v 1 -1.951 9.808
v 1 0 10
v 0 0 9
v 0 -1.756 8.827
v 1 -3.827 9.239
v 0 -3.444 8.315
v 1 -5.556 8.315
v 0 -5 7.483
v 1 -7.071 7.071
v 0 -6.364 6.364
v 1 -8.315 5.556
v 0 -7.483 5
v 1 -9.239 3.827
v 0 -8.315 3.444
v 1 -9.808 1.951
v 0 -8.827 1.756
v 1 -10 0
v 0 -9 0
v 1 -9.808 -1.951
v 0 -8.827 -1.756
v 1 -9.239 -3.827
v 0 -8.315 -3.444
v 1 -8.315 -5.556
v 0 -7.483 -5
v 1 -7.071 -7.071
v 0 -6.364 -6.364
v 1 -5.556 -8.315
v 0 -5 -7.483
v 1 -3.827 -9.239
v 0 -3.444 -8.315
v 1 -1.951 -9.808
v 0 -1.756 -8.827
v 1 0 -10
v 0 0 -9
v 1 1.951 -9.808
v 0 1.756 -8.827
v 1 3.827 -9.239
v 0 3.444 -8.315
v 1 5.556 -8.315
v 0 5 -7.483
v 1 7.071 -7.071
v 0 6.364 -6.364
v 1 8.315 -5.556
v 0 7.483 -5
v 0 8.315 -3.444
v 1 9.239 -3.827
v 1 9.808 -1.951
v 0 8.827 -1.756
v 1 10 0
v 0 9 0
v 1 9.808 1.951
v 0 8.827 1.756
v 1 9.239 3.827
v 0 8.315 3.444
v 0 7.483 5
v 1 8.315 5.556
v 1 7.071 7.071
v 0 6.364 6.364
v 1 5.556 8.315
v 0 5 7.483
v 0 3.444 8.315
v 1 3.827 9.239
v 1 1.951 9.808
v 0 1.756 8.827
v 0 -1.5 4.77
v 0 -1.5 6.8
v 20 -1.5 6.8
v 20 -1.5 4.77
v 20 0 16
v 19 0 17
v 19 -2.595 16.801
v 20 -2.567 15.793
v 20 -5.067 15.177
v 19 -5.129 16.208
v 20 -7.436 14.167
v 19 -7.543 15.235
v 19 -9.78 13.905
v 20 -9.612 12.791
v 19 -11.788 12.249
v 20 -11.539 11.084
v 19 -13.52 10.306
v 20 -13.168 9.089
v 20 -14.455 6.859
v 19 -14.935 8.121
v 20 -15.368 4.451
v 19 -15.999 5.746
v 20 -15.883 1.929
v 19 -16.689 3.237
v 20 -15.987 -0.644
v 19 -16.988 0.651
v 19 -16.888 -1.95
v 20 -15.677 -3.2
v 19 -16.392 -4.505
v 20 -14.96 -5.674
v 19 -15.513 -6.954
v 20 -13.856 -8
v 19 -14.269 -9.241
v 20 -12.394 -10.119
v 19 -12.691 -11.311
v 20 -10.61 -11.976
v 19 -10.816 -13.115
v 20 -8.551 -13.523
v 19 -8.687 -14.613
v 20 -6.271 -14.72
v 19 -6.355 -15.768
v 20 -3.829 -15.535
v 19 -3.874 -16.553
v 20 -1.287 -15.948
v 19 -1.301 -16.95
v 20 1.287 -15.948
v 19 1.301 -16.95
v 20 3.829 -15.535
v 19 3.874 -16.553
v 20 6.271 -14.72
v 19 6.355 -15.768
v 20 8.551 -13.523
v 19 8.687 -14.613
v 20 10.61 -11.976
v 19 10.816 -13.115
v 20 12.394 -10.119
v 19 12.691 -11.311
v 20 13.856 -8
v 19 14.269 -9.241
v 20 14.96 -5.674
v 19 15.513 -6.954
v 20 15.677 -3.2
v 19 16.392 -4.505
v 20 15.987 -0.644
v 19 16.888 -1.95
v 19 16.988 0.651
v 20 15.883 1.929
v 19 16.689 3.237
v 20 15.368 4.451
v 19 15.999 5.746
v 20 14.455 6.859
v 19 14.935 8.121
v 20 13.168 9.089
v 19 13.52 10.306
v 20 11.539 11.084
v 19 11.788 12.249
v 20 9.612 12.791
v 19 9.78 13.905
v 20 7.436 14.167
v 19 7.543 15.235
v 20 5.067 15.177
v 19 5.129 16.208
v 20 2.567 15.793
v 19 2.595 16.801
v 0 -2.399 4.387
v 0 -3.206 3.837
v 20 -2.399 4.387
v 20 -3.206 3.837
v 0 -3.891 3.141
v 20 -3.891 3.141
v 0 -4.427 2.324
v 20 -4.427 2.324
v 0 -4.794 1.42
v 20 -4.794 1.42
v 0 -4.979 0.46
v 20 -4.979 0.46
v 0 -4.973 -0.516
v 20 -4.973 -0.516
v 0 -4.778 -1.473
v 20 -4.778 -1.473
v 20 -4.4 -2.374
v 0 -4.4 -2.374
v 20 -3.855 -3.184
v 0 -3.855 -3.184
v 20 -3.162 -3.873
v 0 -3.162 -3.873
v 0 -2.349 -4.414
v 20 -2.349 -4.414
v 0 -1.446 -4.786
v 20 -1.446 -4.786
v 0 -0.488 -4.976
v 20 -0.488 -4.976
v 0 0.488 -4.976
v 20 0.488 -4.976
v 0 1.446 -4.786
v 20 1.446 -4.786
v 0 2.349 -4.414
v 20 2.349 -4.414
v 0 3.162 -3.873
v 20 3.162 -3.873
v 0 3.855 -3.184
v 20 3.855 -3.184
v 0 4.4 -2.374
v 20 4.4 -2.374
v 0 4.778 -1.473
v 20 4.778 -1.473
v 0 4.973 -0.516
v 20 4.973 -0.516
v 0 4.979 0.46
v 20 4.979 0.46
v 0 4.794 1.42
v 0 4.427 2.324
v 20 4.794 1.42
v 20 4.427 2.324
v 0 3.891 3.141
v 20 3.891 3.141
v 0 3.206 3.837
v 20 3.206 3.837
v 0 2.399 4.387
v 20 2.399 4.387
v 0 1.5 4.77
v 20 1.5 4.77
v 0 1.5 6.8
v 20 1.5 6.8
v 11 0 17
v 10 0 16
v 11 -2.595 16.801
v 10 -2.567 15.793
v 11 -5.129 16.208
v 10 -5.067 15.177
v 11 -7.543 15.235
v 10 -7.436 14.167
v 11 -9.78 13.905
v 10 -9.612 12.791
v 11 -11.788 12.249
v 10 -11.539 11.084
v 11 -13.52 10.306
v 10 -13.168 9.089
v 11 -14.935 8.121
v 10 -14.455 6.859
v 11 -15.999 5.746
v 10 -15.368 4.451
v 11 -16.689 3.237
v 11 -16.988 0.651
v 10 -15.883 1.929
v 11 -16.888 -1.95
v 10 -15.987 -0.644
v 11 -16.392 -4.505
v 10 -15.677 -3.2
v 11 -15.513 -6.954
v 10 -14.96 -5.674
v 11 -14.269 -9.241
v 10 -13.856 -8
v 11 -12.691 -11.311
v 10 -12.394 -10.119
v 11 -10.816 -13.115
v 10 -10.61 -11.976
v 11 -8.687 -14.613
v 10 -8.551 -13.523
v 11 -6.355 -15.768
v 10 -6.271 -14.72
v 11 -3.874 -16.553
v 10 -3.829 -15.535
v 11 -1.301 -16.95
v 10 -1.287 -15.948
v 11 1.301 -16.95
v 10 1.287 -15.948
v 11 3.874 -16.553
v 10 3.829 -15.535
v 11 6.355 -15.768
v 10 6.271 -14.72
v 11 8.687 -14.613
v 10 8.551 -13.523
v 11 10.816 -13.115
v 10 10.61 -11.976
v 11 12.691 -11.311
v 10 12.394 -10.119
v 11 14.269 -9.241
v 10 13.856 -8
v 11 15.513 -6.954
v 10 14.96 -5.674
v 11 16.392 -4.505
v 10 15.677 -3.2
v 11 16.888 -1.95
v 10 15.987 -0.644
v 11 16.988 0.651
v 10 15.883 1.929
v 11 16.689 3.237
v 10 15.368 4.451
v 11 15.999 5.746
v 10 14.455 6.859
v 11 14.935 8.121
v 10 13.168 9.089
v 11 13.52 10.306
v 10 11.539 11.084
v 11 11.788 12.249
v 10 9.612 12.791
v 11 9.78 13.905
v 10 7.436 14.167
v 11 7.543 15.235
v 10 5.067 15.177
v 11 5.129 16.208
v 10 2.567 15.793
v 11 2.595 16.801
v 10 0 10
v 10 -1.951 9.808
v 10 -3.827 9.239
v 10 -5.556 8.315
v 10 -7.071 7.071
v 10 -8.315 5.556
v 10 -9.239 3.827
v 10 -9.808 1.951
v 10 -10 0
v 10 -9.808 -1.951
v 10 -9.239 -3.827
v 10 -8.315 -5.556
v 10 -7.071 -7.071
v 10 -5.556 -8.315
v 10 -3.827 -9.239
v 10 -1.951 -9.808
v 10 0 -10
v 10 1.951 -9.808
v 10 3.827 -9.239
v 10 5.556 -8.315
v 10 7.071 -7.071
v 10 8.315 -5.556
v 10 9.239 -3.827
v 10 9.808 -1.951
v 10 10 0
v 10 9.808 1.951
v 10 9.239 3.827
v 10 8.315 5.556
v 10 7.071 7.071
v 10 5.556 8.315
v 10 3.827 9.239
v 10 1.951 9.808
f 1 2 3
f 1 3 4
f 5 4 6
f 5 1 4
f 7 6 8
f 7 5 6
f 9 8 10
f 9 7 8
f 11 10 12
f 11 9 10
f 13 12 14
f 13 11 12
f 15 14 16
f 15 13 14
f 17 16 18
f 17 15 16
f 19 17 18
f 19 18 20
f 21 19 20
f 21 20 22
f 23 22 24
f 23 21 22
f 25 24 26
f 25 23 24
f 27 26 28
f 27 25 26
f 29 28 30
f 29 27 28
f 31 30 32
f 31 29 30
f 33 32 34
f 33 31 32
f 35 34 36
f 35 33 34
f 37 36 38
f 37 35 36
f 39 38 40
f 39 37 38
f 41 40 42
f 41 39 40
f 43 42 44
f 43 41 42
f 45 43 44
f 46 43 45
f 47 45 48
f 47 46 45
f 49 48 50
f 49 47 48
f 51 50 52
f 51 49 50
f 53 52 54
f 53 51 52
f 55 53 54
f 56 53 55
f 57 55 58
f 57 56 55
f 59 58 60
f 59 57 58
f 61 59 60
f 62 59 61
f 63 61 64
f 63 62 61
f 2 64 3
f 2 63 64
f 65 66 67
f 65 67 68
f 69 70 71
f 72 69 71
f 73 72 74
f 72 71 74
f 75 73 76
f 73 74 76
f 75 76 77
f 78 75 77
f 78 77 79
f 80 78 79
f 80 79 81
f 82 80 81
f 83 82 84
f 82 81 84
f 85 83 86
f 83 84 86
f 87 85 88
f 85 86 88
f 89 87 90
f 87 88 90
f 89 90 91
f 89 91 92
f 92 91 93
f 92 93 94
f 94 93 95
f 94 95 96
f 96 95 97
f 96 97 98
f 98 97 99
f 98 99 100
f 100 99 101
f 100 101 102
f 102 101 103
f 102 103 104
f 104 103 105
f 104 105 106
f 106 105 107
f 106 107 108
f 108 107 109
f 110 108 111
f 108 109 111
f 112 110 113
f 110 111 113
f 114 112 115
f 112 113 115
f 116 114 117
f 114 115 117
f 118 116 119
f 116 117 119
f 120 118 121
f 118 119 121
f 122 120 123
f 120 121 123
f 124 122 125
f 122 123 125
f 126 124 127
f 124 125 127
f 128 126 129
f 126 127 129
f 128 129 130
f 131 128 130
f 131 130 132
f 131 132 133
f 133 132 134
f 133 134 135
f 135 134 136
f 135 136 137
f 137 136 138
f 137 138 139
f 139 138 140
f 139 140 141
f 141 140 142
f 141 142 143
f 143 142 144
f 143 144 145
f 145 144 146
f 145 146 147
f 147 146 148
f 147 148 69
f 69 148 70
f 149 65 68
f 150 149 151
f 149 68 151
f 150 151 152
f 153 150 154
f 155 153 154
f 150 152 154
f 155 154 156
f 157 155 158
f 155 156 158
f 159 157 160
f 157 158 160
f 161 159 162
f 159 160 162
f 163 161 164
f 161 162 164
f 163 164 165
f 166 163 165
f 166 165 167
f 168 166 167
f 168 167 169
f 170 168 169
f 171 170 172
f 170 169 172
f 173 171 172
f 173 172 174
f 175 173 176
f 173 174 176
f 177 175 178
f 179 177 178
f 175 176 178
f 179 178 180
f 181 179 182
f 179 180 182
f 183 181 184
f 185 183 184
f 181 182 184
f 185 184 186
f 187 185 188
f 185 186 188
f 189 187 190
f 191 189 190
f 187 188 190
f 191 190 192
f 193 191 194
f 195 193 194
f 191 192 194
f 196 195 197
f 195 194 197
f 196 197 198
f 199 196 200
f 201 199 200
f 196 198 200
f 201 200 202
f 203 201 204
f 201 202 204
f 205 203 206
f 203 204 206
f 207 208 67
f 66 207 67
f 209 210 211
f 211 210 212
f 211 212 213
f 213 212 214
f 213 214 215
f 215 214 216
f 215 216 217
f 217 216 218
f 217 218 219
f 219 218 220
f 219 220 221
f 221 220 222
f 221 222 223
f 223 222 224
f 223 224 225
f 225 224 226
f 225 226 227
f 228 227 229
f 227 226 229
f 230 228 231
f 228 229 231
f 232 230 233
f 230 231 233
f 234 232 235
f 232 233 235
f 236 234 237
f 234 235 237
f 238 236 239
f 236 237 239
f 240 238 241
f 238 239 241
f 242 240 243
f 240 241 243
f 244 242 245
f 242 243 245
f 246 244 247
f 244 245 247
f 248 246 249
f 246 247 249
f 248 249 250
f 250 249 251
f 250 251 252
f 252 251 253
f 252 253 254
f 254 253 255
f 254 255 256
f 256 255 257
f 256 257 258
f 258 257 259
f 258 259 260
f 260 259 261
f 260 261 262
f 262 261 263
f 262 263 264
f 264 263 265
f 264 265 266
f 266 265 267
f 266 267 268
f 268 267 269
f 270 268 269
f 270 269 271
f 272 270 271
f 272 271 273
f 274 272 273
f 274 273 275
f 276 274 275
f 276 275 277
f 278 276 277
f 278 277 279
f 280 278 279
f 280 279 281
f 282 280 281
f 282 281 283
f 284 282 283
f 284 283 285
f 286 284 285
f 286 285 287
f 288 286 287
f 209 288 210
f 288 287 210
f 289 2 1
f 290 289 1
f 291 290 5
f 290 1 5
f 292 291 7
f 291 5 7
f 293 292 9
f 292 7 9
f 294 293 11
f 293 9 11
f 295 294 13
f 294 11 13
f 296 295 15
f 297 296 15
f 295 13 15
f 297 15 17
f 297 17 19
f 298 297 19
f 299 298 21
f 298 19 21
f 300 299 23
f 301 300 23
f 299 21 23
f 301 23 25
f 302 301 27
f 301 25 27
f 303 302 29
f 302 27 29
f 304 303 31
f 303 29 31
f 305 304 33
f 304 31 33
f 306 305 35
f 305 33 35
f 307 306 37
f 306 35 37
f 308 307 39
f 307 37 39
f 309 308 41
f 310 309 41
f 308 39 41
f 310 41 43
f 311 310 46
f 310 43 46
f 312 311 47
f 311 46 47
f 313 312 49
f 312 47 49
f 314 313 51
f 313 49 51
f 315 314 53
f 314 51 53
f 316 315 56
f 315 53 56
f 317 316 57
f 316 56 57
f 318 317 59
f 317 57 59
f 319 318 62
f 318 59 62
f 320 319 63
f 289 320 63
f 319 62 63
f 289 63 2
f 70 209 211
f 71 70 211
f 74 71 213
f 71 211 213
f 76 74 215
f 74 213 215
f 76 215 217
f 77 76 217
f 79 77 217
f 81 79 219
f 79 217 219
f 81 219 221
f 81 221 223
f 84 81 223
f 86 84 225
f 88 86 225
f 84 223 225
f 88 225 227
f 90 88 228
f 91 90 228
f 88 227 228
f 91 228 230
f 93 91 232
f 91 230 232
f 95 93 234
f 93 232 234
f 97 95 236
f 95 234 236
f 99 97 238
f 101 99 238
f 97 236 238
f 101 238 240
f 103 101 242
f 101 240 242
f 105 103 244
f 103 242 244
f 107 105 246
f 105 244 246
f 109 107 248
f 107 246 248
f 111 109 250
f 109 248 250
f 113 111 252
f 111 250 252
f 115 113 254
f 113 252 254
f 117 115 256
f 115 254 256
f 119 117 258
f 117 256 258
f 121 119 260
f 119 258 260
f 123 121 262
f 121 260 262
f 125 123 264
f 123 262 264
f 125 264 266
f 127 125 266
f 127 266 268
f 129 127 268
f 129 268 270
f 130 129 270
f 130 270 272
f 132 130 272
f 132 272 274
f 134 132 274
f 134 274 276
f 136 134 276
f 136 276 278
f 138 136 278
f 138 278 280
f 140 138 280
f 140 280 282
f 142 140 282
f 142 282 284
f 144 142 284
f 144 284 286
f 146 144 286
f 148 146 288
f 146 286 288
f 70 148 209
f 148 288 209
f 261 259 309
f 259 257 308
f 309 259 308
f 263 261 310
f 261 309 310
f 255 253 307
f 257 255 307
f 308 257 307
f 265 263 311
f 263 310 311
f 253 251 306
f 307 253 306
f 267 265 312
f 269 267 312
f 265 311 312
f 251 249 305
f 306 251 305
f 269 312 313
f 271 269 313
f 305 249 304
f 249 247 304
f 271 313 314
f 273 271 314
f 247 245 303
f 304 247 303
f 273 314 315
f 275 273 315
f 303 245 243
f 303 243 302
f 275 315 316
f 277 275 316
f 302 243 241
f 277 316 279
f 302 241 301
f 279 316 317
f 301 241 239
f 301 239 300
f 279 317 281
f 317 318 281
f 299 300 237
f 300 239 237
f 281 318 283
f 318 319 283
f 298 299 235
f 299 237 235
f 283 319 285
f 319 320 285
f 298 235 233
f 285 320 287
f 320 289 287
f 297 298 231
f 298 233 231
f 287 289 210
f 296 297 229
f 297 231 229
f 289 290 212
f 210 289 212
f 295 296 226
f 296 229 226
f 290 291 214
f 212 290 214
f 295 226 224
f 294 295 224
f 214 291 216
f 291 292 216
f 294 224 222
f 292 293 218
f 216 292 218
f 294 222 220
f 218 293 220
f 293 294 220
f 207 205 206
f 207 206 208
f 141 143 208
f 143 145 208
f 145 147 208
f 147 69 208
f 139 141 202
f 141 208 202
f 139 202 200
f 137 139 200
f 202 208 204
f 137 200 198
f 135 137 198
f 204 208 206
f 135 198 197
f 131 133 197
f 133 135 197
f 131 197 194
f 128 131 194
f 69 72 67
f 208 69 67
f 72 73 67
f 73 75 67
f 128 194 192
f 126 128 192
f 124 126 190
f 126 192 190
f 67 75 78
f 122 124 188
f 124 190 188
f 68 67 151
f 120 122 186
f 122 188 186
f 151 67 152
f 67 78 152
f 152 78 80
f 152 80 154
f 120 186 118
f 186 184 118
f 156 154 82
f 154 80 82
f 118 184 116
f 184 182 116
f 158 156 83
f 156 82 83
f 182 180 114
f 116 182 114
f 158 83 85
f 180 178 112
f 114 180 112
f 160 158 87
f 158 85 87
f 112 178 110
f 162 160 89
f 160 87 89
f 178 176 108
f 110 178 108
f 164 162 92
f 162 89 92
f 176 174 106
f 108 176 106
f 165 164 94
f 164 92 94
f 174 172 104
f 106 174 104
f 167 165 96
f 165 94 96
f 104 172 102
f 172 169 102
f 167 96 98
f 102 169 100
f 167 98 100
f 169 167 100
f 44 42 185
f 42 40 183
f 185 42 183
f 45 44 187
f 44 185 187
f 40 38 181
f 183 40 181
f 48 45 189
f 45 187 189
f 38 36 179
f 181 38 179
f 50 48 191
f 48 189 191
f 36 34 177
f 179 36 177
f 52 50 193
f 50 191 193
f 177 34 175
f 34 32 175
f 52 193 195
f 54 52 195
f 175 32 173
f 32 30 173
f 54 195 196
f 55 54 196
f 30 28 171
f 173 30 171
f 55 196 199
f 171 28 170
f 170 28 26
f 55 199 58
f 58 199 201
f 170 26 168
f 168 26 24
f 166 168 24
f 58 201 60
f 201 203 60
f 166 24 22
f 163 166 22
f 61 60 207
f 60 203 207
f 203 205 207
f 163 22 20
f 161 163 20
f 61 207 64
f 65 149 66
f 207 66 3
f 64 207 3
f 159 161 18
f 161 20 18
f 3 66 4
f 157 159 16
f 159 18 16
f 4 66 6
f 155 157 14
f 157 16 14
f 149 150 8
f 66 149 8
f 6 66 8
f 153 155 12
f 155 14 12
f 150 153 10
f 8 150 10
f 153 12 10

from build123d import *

# Parameters (mm, degrees)
F2_SIZE  = 1
F4_DEPTH = 20


with BuildPart() as f1:
    # F0 (on Front) → F1 (revolve)
    with BuildSketch(Plane.XZ):
        Polygon((0, 10), (0, 0), (20, 0), (20, 17), (10, 17), (10, 10), align=None)
    revolve(axis=Axis((10, 0, 0), (1, 0, 0)))

    # F2
    f2_edges = [f1.edges().sort_by_distance(p)[0] for p in [
        (10, 0, -17),
        (0, 0, -10),
        (20, 0, -17),
    ]]
    chamfer(f2_edges, length=F2_SIZE)

    # F3 (on face) → F4 (cut)
    with BuildSketch(Plane.YZ.offset(20)):
        with BuildLine():
            Line((-1.5, 6.8), (-1.5, 4.769696))
            ThreePointArc((-1.5, 4.769696), (0, -5), (1.5, 4.769696))
            Line((1.5, 4.769696), (1.5, 6.8))
            Line((1.5, 6.8), (0, 6.8))
            Line((0, 6.8), (-1.5, 6.8))
        make_face()
    extrude(amount=-F4_DEPTH, mode=Mode.SUBTRACT)


solid = f1.part
